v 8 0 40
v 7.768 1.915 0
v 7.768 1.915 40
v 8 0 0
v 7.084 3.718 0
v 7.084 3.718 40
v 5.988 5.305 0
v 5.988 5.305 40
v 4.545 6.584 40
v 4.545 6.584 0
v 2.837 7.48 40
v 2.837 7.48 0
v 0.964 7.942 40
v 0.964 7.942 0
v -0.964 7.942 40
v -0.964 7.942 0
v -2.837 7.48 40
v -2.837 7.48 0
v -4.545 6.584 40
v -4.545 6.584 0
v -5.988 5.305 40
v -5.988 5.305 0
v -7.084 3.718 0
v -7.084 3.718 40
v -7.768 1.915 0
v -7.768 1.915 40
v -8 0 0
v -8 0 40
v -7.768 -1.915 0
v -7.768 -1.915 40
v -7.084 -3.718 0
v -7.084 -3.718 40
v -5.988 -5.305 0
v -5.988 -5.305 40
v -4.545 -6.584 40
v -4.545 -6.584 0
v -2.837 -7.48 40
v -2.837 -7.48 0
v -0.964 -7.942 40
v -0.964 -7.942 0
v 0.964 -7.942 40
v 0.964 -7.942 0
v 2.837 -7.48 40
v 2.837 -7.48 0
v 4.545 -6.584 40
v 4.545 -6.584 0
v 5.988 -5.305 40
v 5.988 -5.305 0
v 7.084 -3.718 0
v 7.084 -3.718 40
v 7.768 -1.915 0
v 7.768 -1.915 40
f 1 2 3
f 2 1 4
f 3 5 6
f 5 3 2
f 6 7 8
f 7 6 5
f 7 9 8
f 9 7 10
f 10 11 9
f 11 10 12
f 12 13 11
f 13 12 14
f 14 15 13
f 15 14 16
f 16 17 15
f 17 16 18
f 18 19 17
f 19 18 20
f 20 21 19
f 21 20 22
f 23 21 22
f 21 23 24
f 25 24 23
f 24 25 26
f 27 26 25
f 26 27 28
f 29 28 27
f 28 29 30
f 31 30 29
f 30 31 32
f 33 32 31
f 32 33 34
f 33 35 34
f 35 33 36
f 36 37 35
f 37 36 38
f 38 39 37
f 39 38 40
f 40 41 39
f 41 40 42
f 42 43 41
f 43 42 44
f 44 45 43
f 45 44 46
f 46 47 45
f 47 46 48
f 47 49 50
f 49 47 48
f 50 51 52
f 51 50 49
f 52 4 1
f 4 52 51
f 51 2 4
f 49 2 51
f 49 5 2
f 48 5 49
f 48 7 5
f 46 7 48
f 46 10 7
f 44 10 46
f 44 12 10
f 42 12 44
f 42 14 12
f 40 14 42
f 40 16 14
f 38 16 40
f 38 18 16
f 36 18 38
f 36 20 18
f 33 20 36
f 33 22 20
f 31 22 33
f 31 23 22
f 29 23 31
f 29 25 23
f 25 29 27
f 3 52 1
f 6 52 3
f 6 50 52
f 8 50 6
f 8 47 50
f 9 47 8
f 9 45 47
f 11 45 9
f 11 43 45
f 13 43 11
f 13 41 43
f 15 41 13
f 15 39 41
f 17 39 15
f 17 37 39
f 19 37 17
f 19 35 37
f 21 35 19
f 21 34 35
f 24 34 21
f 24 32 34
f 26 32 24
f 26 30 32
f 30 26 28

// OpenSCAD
module rounding_cylinder_centered() {
    cylinder(h=40, r=8);
}

// call module when run directly
rounding_cylinder_centered();
